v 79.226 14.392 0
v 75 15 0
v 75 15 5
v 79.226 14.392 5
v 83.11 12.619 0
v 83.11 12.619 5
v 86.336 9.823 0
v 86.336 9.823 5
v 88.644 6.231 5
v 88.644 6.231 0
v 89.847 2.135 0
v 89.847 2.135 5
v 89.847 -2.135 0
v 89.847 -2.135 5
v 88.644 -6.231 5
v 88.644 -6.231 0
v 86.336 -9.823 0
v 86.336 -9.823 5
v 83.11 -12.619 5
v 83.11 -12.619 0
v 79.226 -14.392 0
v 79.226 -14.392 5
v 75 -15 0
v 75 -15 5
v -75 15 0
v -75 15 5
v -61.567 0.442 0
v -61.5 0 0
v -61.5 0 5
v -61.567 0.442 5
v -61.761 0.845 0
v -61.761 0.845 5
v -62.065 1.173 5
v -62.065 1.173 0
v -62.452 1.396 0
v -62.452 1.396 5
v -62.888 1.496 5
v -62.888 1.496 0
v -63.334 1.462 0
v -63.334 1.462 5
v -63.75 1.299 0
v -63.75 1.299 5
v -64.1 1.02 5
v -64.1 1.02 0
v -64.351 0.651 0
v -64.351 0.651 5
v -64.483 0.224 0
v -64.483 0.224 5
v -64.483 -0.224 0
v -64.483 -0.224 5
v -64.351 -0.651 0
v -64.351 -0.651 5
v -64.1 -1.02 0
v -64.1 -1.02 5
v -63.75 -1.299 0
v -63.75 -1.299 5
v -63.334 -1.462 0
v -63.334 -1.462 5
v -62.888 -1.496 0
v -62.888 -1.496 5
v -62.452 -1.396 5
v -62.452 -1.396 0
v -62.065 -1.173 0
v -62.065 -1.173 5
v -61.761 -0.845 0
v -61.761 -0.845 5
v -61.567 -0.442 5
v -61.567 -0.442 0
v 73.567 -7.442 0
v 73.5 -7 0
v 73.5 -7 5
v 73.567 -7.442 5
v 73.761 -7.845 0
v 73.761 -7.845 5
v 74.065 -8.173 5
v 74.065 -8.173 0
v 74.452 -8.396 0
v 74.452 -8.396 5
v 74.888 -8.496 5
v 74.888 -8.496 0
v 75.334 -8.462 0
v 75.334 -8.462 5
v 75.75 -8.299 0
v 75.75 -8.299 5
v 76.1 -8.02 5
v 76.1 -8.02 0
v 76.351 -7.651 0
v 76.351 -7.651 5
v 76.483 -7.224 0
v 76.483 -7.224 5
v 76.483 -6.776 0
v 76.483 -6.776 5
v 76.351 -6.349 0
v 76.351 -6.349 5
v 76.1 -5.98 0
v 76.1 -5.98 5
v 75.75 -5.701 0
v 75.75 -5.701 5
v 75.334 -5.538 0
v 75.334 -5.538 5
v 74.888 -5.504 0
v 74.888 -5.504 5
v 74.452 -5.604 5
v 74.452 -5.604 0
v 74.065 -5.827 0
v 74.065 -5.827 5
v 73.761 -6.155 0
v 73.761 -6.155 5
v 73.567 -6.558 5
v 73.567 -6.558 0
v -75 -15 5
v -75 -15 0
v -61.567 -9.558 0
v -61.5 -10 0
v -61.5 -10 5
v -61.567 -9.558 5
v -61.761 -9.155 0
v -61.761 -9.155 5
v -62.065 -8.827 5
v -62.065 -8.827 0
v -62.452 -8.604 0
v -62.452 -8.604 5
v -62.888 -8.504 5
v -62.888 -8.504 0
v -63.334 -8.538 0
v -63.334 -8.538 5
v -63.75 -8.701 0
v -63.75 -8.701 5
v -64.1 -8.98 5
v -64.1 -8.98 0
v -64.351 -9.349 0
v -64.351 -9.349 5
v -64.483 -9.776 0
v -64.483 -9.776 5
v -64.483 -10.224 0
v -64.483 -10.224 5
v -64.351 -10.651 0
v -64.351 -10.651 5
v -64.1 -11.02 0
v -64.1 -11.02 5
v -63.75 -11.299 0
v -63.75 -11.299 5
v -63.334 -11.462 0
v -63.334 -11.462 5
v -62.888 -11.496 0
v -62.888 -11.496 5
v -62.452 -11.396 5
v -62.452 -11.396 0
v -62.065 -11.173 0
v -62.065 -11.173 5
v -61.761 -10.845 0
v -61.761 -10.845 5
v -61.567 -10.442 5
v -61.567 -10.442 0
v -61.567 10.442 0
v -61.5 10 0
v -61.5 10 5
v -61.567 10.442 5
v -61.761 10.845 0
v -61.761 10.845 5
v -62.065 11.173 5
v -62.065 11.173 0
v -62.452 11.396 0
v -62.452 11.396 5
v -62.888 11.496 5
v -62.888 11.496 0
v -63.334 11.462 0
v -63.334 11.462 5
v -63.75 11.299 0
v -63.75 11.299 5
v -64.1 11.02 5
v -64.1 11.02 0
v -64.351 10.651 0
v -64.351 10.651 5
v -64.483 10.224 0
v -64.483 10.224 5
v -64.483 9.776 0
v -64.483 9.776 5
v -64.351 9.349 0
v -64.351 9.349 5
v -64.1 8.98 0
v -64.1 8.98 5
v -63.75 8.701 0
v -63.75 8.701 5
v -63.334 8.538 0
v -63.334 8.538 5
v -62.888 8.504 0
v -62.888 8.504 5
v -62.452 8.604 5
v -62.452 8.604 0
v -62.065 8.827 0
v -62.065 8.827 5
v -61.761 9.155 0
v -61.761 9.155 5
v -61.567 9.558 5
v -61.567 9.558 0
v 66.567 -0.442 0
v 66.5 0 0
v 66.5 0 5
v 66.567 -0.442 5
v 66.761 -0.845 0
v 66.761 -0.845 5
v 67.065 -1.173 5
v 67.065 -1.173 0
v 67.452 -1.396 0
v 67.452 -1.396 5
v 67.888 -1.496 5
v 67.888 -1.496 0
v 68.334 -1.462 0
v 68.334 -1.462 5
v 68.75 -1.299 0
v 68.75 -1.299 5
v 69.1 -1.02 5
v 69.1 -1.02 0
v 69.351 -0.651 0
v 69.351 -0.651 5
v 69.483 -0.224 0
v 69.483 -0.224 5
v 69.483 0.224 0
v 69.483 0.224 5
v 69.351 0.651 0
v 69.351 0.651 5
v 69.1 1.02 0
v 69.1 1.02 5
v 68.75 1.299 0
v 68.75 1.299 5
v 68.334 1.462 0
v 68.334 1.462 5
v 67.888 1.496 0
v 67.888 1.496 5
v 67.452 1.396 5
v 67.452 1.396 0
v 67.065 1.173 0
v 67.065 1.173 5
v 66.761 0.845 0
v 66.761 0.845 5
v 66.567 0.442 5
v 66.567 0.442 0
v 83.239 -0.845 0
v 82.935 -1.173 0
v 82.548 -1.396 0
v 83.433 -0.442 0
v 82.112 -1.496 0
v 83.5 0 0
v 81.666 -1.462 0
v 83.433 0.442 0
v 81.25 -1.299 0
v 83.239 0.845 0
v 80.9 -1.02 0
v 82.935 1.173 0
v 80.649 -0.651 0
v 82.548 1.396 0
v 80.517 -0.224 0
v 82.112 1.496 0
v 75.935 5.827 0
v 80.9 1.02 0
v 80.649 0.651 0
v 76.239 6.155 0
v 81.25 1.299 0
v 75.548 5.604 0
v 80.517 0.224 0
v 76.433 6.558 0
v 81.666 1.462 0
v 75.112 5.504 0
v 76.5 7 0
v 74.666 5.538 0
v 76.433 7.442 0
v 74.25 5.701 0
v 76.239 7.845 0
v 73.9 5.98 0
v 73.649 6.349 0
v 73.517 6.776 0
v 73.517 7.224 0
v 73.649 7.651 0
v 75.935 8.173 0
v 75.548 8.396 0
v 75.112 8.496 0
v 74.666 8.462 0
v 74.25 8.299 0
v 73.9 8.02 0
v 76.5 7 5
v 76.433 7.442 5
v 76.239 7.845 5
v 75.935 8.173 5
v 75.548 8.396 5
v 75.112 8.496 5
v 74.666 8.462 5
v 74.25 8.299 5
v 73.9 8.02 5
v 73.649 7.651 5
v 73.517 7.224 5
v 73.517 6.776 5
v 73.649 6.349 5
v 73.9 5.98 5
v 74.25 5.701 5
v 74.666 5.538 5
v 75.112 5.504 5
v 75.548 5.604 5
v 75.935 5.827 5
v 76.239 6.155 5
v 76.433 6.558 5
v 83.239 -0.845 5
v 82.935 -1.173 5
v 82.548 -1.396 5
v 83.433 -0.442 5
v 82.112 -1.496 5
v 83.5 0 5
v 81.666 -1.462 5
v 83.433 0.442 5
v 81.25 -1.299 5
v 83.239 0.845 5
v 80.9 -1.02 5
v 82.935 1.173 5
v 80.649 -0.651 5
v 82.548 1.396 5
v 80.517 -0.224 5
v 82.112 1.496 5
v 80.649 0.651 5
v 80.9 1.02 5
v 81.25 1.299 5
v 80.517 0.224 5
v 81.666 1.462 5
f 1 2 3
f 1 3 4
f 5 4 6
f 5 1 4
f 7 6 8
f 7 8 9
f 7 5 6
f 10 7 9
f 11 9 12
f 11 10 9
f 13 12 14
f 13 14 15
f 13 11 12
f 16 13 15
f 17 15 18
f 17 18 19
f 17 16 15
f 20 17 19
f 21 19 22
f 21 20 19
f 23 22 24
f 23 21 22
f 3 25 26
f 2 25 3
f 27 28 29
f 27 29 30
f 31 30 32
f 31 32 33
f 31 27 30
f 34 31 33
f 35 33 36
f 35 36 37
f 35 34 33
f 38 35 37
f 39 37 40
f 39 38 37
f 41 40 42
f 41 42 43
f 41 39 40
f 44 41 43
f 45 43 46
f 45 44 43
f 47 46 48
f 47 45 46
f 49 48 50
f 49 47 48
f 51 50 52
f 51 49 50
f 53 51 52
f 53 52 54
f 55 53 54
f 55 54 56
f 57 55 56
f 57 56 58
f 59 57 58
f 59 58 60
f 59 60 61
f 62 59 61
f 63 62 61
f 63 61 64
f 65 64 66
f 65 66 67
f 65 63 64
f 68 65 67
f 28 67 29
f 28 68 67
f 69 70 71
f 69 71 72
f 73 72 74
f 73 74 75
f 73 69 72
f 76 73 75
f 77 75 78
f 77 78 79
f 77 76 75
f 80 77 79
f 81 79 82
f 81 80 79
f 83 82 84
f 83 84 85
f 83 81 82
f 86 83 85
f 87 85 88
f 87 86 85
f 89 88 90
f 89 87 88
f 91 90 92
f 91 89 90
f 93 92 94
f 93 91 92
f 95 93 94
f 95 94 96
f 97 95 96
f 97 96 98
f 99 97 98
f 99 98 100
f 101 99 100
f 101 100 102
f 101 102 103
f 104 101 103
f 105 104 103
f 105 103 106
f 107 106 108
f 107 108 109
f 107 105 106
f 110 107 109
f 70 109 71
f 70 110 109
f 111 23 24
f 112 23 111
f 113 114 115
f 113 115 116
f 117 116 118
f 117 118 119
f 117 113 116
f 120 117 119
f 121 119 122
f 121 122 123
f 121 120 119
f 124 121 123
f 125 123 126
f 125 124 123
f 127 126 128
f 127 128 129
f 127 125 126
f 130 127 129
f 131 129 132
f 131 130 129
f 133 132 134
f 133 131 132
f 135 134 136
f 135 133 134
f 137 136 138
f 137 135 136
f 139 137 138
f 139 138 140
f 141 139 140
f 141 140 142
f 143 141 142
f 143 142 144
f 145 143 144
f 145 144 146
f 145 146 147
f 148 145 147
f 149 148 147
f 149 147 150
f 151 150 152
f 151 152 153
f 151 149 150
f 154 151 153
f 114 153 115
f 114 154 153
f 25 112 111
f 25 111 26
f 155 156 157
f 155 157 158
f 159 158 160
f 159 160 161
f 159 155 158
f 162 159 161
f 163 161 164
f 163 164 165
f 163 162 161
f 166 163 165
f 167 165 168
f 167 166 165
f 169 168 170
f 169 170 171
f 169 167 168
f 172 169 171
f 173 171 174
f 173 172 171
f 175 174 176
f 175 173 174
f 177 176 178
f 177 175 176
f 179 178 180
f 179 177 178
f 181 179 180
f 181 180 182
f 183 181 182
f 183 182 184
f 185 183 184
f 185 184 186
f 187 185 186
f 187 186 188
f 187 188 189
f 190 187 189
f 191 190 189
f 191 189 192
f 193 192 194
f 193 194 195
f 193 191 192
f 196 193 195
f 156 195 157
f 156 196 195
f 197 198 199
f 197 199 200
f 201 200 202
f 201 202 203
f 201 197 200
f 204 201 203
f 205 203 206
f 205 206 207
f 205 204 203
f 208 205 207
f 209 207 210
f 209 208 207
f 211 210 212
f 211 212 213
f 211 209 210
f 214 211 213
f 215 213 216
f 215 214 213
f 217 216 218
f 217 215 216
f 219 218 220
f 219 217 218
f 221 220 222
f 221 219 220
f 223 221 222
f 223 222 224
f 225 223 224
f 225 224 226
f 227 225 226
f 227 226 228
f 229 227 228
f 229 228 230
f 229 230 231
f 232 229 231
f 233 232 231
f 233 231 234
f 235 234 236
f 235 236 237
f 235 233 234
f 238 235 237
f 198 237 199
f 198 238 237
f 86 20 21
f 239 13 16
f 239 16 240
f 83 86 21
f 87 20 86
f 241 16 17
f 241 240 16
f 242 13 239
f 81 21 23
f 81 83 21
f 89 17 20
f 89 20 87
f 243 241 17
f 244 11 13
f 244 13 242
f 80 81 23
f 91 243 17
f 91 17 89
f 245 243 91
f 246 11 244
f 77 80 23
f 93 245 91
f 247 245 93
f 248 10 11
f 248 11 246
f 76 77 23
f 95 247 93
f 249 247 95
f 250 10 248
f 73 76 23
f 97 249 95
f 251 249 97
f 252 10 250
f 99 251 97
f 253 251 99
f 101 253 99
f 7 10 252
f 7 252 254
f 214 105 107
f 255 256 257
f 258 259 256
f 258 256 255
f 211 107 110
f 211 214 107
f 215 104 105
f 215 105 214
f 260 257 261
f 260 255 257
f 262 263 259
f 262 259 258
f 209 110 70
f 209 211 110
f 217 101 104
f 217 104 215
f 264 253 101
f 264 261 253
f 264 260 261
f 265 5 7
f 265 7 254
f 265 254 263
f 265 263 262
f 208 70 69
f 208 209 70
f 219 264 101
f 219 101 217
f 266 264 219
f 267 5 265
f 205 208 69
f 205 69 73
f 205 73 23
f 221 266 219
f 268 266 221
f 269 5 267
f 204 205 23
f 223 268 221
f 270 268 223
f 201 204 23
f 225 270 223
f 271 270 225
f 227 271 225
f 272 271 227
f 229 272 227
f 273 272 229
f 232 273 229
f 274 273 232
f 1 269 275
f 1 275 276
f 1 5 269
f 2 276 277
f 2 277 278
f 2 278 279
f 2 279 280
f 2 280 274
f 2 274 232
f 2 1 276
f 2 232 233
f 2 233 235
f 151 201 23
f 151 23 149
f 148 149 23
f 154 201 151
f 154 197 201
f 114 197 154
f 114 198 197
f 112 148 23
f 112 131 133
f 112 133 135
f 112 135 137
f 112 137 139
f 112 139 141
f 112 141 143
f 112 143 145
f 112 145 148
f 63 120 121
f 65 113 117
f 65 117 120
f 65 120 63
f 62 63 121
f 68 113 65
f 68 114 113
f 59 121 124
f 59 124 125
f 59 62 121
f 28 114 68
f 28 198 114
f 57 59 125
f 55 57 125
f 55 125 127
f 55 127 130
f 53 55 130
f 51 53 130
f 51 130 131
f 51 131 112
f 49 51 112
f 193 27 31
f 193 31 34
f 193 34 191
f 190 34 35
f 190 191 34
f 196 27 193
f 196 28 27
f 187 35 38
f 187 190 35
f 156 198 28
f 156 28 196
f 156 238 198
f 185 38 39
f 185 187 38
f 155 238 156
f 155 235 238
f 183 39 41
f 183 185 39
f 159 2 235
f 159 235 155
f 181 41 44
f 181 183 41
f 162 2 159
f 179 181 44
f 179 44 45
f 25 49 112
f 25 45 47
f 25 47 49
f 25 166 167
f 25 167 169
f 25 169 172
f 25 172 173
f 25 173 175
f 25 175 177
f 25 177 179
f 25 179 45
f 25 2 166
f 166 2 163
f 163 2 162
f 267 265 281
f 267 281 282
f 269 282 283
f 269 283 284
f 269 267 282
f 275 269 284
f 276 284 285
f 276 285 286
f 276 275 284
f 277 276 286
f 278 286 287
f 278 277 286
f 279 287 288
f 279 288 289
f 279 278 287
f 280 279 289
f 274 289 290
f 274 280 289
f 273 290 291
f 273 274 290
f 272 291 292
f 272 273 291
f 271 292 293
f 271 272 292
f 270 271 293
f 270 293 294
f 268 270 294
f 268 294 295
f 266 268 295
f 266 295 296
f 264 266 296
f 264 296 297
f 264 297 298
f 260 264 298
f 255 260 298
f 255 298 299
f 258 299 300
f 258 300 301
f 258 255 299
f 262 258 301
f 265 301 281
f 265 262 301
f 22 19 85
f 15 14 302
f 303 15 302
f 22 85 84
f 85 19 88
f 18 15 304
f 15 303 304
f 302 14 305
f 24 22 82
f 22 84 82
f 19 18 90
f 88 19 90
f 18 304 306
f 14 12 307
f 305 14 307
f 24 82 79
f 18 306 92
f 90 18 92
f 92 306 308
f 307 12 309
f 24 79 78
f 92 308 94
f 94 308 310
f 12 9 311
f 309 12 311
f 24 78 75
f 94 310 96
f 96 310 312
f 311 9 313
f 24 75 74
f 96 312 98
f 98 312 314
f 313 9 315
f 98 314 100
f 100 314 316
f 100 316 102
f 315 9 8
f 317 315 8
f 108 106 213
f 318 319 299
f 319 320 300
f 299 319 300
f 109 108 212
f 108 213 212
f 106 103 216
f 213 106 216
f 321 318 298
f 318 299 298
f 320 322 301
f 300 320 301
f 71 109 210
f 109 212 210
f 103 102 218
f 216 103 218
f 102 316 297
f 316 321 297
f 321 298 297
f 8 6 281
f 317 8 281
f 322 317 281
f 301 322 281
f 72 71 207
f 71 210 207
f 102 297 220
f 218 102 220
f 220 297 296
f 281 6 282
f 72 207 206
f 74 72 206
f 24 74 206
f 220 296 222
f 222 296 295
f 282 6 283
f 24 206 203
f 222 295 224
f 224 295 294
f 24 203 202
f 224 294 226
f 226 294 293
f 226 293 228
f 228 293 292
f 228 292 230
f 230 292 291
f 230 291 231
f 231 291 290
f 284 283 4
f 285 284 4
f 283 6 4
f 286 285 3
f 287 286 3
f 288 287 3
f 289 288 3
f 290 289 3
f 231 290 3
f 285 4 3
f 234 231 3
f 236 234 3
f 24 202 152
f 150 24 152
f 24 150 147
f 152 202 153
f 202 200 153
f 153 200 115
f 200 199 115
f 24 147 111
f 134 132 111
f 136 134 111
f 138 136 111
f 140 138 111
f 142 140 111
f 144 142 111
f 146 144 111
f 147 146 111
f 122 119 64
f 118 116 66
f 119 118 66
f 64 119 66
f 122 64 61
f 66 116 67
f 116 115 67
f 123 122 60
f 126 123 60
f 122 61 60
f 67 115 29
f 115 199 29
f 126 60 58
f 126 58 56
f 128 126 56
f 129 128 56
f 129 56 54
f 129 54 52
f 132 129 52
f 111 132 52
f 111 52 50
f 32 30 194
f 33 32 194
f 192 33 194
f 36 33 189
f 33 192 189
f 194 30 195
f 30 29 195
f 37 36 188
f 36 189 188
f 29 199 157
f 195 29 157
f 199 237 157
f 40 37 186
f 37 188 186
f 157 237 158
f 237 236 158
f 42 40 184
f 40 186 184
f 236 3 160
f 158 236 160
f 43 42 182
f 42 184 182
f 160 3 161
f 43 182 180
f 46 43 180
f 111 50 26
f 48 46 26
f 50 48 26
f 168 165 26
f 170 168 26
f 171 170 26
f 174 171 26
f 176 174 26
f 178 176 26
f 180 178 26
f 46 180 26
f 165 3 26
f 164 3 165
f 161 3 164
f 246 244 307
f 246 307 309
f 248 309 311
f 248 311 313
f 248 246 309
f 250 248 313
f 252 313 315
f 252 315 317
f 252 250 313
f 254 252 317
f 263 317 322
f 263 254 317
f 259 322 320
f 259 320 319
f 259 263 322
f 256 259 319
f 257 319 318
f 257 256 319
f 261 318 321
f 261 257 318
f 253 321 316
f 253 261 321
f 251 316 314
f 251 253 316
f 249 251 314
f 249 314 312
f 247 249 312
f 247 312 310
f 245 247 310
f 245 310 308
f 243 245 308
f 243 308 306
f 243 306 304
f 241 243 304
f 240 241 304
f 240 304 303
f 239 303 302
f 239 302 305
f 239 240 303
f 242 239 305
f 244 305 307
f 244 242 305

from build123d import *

# Parameters (mm, degrees)
SKETCH1_R           = 1.5
BOSS_EXTRUDE1_DEPTH = 5


with BuildPart() as part:
    # Sketch1 → Boss-Extrude1 (new body)
    with BuildSketch(Plane.XY):
        with BuildLine():
            Line((75.000000208, -15), (-75.000000208, -15))
            Line((-75.000000208, -15), (-75.000000208, 15))
            Line((-75.000000208, 15), (75.000000208, 15))
            ThreePointArc((75.000000208, 15), (89.999999792, 0), (75.000000208, -15))
        make_face()
        with Locations((75, 7)):
            Circle(SKETCH1_R, mode=Mode.SUBTRACT)
        with Locations((82, 0)):
            Circle(SKETCH1_R, mode=Mode.SUBTRACT)
        with Locations(Location((68, 0, 0), (0, 0, 180))):
            Circle(SKETCH1_R, mode=Mode.SUBTRACT)
        with Locations(Location((75, -7, 0), (0, 0, 180))):
            Circle(SKETCH1_R, mode=Mode.SUBTRACT)
        with Locations((-63.000000208, 0)):
            Circle(SKETCH1_R, mode=Mode.SUBTRACT)
        with Locations((-63.000000208, 10)):
            Circle(SKETCH1_R, mode=Mode.SUBTRACT)
        with Locations((-63.000000208, -10)):
            Circle(SKETCH1_R, mode=Mode.SUBTRACT)
    extrude(amount=BOSS_EXTRUDE1_DEPTH)


solid = part.part
